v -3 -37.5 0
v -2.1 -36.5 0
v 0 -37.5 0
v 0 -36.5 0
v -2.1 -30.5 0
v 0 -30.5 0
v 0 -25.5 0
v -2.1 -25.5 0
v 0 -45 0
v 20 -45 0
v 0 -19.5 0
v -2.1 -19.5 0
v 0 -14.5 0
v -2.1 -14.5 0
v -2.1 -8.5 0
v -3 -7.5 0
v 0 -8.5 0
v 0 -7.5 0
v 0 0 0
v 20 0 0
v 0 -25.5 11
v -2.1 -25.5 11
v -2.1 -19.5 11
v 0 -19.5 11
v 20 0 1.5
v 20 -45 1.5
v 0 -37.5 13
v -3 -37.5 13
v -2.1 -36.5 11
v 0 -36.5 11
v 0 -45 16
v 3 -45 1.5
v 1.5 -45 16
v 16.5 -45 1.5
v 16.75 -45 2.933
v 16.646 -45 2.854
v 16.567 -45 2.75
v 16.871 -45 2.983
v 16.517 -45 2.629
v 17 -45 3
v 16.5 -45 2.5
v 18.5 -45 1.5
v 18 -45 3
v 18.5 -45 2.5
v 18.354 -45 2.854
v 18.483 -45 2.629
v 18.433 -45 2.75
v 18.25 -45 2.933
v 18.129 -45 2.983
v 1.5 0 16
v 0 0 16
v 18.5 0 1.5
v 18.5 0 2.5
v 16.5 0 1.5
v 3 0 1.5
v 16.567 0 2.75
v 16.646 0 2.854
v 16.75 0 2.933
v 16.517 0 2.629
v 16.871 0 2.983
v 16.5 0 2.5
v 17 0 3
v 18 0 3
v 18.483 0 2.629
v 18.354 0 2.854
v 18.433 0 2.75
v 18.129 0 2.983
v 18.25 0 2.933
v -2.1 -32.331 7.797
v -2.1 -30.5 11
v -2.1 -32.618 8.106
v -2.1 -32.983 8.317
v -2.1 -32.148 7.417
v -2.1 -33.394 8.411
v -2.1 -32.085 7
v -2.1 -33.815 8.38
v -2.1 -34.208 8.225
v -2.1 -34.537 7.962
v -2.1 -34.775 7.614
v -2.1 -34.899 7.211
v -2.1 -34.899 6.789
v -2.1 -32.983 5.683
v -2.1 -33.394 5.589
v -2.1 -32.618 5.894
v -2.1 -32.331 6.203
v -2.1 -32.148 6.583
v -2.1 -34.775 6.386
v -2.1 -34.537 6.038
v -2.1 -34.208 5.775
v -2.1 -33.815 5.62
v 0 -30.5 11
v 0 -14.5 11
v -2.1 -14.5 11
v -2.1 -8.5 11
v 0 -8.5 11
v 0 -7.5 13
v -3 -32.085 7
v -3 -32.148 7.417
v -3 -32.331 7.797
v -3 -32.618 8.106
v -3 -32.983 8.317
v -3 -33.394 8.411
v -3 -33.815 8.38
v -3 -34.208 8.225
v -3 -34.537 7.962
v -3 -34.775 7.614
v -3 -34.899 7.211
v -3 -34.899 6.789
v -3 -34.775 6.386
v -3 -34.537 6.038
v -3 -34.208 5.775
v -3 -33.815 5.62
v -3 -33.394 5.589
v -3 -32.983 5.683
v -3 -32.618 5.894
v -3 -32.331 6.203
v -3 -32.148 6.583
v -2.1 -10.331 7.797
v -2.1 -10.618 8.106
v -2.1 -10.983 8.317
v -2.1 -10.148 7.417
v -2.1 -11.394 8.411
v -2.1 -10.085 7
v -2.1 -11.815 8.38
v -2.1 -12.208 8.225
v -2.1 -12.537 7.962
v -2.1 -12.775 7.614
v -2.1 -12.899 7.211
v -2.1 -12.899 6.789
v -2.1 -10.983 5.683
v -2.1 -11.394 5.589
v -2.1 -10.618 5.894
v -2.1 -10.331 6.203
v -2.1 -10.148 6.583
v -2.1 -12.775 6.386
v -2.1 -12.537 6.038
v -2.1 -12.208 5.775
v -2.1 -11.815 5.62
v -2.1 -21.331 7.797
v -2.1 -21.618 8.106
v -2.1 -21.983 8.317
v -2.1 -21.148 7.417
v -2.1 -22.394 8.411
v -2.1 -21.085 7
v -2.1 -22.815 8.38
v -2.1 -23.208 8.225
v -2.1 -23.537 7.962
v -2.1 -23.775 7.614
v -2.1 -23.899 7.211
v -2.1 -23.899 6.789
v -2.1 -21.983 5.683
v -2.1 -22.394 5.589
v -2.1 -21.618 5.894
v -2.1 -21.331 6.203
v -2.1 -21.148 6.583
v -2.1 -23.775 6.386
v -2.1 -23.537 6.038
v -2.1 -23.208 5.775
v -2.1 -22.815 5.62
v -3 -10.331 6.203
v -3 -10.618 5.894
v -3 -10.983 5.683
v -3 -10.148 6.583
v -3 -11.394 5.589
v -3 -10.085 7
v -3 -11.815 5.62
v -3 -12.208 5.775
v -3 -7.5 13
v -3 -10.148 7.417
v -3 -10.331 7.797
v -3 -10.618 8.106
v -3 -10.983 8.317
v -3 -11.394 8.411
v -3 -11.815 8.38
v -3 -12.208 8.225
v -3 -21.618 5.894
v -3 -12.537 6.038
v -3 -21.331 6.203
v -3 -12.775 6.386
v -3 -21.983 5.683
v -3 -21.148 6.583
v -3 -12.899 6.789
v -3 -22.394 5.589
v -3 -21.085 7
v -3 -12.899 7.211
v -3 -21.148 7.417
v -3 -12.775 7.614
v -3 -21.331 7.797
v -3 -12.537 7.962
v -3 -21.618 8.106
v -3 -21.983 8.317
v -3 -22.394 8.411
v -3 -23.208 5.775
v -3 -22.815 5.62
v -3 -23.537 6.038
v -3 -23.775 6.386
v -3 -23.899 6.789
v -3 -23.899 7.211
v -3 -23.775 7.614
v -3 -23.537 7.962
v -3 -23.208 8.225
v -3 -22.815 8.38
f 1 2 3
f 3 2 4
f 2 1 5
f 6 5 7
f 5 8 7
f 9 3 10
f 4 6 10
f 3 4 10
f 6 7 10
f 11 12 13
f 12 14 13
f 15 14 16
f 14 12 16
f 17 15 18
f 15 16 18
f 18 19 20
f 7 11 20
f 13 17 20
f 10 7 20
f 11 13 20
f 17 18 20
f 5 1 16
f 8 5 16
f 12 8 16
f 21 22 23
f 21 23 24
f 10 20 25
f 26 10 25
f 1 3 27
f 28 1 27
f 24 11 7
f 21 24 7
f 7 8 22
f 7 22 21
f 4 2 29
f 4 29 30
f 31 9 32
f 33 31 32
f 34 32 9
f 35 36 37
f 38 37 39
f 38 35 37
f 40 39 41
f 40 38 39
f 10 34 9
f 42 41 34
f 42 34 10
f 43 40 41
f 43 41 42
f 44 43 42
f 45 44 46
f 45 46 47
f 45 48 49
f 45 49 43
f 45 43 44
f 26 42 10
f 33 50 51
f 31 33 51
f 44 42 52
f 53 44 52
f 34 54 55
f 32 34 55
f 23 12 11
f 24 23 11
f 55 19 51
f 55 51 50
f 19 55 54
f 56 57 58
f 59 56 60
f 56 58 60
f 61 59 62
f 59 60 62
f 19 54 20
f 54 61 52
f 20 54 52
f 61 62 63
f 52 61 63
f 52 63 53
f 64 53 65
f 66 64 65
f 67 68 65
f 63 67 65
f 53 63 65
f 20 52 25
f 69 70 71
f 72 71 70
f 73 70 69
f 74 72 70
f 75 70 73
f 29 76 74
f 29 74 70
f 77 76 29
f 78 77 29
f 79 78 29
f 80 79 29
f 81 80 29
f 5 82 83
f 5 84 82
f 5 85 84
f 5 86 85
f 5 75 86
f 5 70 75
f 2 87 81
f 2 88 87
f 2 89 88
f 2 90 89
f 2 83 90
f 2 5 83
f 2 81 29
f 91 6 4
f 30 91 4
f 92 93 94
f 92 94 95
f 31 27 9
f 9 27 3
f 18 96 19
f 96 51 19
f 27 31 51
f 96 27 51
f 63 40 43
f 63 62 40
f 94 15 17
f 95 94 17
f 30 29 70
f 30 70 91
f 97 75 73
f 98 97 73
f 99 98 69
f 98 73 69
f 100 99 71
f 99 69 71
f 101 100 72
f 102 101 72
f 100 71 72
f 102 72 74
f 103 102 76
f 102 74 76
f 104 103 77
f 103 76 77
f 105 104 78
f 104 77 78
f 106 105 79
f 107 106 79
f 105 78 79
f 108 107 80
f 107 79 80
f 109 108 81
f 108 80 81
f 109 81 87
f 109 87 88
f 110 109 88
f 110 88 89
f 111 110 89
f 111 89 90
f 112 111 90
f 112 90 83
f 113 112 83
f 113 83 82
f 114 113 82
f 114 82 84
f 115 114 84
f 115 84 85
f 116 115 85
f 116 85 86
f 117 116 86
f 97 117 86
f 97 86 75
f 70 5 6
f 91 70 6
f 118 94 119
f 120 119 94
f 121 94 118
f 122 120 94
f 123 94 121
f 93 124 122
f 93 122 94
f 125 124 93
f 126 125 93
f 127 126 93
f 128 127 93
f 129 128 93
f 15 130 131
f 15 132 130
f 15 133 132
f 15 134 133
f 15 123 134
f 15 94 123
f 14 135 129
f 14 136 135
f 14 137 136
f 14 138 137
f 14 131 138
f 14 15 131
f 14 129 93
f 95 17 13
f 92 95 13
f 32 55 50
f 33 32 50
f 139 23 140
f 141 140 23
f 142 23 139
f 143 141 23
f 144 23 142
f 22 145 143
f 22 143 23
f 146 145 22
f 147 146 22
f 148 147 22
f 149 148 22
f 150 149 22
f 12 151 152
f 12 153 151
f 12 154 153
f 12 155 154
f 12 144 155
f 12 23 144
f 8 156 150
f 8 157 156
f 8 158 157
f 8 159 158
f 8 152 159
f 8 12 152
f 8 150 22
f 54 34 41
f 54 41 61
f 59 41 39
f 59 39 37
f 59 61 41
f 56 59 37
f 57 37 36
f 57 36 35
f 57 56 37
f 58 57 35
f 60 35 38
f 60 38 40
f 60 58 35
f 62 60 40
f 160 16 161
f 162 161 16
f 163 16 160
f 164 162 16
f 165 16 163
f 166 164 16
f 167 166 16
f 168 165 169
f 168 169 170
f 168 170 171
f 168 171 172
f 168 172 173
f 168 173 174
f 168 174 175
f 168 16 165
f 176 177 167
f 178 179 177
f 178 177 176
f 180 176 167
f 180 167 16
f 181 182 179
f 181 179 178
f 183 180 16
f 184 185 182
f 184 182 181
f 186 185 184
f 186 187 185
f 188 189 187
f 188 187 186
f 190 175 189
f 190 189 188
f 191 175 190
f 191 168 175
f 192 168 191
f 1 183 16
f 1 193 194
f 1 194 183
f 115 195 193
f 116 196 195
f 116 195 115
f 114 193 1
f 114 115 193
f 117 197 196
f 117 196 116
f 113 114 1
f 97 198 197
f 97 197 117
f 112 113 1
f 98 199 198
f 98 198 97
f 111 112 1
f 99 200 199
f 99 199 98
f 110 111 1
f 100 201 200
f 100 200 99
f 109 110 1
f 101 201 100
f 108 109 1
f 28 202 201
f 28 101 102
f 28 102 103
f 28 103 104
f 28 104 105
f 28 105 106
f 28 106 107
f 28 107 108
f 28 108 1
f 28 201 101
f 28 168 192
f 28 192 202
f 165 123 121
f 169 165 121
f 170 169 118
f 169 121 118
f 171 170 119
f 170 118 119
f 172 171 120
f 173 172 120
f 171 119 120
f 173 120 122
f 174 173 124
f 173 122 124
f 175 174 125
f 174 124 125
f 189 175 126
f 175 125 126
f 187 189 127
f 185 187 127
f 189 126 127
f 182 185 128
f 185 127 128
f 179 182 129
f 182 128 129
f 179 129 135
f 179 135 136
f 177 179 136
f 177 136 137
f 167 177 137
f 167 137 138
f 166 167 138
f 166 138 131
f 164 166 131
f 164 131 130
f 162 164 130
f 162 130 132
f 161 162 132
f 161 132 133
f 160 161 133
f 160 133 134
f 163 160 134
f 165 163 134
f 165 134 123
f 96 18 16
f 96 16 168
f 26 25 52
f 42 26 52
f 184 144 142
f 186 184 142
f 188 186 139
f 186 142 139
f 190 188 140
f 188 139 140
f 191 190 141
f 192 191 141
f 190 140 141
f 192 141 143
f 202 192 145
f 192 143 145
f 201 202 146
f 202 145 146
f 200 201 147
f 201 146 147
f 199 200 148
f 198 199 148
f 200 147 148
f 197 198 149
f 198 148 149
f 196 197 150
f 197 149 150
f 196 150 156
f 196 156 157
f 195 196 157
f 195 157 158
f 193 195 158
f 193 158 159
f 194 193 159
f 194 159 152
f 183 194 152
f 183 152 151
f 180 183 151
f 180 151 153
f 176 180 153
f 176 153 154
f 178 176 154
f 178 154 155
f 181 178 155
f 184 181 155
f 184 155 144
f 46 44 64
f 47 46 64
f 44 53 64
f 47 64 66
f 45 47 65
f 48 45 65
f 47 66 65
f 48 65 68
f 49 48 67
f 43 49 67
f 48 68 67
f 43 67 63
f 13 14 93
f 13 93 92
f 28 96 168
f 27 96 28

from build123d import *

# Parameters (mm, degrees)
F1_DEPTH = 45
F2_W     = 30
F2_H     = 13
F3_DEPTH = 3
F4_W     = 2.1
F4_H     = 6
F5_DEPTH = 11
F7_D     = 2.83
F7_DEPTH = 2
F7_TIP   = 0.8502177759
F8_W     = 2
F8_H     = 45
F9_DEPTH = 1.5
F10_R    = 0.5


with BuildPart() as f1:
    # F0 (on Front) → F1 (new body)
    with BuildSketch(Plane.XZ):
        Polygon((0, 16), (0, 0), (20, 0), (20, 1.5), (3, 1.5), (1.5, 16), align=None)
    extrude(amount=F1_DEPTH)

    # F2 (on face) → F3 (join)
    with BuildSketch(Plane(origin=(0, 0, 0), x_dir=(0, -1, 0), z_dir=(-1, 0, 0))):
        with Locations((22.5, 6.5)):
            Rectangle(F2_W, F2_H)
    extrude(amount=F3_DEPTH)

    # F4 (on face) → F5 (cut)
    with BuildSketch(Plane(origin=(0, 0, 0), x_dir=(1, 0, 0), z_dir=(0, 0, -1))):
        with Locations((-1.05, 33.5)):
            Rectangle(F4_W, F4_H)
        with Locations((-1.05, 22.5)):
            Rectangle(F4_W, F4_H)
        with Locations((-1.05, 11.5)):
            Rectangle(F4_W, F4_H)
    extrude(amount=-F5_DEPTH, mode=Mode.SUBTRACT)

    # F7
    with Locations(Plane(origin=(-3, 0, 0), x_dir=(0, -1, 0), z_dir=(-1, 0, 0))):
        with Locations((33.5, 7), (22.5, 7), (11.5, 7)):
            Hole(F7_D / 2, depth=F7_DEPTH)
            with Locations((0, 0, -(F7_DEPTH + F7_TIP / 2))):  # 118° drill point
                Cone(0, F7_D / 2, F7_TIP, mode=Mode.SUBTRACT)

    # F8 (on face) → F9 (join)
    with BuildSketch(Plane.XY.offset(1.5)):
        with Locations((17.5, -22.5)):
            Rectangle(F8_W, F8_H)
    extrude(amount=F9_DEPTH)

    # F10
    f10_edges = [f1.edges().sort_by_distance(p)[0] for p in [
        (18.5, -22.5, 3),
        (16.5, -22.5, 3),
    ]]
    fillet(f10_edges, radius=F10_R)


solid = f1.part
